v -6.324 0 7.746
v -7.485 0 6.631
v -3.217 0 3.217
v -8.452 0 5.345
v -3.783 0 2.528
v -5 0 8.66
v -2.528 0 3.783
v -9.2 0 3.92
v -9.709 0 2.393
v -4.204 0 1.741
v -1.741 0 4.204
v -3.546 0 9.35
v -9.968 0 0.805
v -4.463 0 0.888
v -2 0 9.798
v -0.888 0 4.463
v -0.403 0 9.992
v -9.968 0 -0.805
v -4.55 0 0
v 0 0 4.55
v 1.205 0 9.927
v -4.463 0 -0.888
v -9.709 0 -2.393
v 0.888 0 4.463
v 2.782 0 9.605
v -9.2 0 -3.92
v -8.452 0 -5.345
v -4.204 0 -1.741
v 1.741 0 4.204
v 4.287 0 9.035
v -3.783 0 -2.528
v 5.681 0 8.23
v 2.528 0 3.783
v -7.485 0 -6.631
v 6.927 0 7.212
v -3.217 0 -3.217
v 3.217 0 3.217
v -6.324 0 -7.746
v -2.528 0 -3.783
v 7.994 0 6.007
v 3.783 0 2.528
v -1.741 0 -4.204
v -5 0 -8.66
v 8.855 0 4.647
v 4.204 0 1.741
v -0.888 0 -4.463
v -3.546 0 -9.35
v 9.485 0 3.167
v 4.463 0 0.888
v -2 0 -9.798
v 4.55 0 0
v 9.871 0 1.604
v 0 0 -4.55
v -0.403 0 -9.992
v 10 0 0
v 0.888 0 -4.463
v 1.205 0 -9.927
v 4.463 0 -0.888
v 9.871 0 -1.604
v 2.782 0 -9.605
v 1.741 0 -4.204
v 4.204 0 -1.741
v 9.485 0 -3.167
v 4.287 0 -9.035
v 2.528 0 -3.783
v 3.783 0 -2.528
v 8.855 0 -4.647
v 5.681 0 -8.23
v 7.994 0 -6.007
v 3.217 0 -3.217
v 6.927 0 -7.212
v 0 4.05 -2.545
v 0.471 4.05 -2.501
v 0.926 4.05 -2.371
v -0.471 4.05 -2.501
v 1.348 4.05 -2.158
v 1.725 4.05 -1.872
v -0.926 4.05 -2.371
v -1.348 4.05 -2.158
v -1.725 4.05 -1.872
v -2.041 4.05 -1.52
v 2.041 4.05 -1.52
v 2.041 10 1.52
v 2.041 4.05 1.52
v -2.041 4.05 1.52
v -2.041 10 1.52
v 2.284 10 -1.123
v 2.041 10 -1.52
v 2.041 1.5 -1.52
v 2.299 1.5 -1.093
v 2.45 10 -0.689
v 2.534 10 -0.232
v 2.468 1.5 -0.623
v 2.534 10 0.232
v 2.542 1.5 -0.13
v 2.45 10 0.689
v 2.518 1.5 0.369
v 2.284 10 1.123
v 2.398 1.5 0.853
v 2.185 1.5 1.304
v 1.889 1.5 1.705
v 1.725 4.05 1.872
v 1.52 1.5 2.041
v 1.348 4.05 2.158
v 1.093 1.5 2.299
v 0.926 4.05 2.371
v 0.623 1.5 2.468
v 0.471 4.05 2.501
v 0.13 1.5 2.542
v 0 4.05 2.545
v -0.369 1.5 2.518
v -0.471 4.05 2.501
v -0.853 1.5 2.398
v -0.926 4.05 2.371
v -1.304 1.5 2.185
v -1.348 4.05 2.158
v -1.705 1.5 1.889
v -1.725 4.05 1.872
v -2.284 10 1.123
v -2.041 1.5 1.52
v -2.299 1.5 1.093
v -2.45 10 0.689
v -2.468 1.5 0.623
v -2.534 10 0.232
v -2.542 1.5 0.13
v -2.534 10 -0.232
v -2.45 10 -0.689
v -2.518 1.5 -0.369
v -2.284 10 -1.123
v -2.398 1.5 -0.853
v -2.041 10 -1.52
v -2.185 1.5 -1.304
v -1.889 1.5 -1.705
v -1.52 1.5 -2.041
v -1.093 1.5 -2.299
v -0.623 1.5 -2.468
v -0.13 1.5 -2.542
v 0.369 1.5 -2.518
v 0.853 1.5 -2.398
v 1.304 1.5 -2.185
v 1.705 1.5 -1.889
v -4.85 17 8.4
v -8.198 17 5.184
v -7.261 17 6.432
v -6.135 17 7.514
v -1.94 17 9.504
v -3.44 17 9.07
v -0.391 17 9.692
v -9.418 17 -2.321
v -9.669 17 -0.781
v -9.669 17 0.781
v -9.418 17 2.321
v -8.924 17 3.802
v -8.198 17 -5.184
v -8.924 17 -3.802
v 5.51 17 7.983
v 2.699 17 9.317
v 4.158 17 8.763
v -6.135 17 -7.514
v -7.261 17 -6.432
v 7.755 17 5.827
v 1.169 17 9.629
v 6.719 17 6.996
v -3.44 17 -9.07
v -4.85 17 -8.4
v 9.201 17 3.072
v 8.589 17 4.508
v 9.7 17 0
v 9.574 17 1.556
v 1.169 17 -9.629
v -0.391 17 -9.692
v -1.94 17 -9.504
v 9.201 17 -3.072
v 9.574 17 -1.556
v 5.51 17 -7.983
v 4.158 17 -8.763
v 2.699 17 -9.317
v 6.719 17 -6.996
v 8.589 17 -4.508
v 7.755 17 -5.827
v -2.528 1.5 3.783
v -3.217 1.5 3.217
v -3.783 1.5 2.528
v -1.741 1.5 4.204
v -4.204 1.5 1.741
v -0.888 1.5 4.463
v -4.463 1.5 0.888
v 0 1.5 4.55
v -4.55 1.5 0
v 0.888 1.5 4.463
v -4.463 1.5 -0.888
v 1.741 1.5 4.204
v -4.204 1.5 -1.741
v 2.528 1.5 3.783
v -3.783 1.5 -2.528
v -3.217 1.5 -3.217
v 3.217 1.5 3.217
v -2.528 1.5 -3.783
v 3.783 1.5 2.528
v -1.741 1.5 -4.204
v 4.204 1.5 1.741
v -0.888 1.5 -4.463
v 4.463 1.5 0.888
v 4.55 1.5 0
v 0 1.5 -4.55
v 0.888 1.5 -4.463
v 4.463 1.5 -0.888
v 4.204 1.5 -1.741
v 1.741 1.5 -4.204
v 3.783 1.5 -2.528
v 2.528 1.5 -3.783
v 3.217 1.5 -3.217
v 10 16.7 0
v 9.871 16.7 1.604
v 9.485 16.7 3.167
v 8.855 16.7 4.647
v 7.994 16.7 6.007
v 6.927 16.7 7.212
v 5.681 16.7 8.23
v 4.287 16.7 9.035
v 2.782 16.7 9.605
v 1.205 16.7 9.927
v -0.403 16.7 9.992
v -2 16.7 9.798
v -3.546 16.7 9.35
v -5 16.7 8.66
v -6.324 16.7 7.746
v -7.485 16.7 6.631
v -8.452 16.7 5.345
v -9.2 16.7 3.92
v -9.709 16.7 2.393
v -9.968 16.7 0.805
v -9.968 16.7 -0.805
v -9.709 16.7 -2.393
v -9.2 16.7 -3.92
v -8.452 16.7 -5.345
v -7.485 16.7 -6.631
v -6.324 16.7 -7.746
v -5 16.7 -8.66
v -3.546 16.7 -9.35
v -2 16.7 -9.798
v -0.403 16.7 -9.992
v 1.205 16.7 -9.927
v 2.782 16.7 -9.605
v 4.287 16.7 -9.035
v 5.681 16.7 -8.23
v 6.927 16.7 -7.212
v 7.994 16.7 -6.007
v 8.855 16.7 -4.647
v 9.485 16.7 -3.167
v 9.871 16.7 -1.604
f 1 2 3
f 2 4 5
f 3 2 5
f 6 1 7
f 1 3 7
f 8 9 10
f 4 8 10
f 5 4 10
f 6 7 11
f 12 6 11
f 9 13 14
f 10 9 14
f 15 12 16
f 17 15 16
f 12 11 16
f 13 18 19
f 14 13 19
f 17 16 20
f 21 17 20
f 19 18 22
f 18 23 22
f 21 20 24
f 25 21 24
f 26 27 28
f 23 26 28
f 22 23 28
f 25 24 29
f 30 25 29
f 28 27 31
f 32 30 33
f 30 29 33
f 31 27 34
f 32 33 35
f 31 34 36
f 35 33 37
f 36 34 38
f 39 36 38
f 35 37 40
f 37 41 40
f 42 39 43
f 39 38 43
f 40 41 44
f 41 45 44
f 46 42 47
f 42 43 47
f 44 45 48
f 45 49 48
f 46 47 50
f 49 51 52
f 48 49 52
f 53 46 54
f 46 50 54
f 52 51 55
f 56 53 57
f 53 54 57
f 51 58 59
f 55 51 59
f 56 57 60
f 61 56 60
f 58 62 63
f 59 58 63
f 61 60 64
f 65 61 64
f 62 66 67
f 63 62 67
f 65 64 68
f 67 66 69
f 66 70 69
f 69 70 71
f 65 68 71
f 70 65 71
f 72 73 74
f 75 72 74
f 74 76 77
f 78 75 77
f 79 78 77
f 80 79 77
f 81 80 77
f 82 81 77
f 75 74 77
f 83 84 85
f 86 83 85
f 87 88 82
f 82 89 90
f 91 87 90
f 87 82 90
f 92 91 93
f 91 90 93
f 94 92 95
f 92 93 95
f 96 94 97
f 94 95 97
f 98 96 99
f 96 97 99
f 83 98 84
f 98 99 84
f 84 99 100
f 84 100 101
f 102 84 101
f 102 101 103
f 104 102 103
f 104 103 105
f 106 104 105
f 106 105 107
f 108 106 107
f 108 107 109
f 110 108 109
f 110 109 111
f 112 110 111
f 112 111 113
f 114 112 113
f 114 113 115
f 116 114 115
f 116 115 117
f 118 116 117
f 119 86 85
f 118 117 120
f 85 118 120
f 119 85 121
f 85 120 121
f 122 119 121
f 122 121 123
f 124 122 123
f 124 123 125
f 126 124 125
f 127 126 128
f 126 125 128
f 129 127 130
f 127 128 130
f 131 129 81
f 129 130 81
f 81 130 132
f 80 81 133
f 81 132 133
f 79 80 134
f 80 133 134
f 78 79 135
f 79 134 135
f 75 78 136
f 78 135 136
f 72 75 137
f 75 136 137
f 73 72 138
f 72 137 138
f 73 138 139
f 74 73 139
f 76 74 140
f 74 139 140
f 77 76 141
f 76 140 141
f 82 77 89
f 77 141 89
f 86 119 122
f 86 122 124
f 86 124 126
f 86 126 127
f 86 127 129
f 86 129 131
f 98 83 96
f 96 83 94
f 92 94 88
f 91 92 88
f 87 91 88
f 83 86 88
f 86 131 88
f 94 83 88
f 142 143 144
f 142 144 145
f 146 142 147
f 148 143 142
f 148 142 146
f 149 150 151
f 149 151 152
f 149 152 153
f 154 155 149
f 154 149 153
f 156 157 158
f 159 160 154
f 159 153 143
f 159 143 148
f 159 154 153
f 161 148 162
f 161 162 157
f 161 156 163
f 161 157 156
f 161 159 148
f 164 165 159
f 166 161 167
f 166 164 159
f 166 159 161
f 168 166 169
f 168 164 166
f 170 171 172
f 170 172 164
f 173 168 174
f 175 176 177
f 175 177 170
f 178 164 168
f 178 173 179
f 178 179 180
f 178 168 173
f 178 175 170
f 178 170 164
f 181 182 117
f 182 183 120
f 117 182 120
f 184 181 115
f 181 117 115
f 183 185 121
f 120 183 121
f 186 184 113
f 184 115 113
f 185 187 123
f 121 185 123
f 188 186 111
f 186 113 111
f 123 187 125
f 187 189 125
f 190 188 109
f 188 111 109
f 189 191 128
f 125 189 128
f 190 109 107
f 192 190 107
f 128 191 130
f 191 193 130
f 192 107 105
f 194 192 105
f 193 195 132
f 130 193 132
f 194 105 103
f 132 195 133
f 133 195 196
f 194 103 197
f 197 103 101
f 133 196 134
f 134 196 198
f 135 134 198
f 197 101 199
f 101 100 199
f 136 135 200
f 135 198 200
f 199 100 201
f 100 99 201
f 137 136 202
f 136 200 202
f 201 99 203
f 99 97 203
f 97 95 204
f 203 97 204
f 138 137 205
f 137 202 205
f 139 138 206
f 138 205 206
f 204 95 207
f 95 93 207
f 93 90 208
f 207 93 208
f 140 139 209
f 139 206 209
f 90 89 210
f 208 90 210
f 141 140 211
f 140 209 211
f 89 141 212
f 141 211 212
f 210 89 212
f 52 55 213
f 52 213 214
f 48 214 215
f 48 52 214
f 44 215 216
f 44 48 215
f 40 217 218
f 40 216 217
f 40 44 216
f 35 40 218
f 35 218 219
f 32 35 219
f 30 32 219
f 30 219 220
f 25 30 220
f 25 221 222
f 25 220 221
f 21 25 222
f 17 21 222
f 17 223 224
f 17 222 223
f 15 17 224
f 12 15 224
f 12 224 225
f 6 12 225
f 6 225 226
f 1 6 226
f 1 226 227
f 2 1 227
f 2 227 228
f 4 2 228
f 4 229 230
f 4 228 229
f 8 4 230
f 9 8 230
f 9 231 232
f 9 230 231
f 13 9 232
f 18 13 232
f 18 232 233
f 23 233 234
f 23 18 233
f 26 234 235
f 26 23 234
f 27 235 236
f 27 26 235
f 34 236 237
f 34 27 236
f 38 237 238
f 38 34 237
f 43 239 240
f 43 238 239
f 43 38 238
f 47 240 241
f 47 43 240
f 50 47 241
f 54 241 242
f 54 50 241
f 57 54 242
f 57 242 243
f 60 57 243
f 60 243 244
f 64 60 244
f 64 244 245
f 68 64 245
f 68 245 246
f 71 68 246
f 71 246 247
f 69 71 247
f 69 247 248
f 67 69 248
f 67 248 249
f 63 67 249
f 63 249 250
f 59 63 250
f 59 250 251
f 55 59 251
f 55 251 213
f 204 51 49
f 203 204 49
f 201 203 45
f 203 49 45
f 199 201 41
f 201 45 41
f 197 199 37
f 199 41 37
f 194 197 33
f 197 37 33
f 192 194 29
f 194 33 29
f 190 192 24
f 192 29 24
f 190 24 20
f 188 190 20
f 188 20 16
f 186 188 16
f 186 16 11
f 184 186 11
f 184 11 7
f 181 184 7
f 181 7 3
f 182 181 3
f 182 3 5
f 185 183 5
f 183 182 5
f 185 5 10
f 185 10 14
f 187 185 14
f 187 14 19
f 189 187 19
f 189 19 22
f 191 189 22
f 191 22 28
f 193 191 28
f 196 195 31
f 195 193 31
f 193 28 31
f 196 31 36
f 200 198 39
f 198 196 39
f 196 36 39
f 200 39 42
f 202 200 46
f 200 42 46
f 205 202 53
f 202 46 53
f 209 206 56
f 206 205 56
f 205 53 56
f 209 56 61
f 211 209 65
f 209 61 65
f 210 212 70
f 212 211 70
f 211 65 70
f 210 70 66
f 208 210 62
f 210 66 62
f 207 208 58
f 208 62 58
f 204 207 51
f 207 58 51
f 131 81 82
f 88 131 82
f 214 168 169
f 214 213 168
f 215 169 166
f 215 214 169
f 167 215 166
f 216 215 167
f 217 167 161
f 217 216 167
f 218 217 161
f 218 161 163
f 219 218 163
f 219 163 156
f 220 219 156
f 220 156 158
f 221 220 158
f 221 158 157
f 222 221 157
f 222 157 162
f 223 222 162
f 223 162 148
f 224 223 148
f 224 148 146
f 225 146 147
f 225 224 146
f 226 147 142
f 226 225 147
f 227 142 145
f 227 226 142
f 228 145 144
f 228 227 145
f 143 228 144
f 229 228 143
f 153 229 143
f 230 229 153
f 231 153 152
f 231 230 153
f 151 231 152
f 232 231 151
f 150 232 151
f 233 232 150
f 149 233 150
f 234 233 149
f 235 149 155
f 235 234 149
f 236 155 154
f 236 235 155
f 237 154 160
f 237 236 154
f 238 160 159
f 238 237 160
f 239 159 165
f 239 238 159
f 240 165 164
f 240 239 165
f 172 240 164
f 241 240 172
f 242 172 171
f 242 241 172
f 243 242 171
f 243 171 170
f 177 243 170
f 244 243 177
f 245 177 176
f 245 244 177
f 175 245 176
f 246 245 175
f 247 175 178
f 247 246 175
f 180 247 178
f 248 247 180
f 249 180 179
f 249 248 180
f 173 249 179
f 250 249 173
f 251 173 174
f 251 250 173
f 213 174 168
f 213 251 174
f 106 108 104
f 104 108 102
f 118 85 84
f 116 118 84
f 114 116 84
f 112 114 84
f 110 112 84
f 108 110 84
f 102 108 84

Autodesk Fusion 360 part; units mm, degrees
sketch "Sketch1" plane through (0, 0, 0) normal (0, 1, 0) x (1, 0, 0)
  circle A0 centre (0, 0) radius 10
  circle A1 centre (0, 0) radius 4.55
  circle A2 centre (0, 0) radius 2.545
  line L0 (0, 1.52) -> (2.0412, 1.52)
  line L1 (0, 1.52) -> (-2.0412, 1.52)
  line L2 (0, -1.52) -> (-2.0412, -1.52)
  line L3 (0, -1.52) -> (2.0412, -1.52)
  dimension "d1" = 20
  dimension "d2" = 9.1
  dimension "d3" = 5.09
  dimension "d4" = 1.52
  dimension "d6" = 1.52
extrude "Extrude1" add sketch "Sketch1" along normal blind 17 contours A0 | A1 | A2 L0 L1 L2 L3 | A2 L0 L1 | A2 L2 L3
extrude "Extrude2" cut sketch "Sketch1" along normal blind 10 contours A2 L0 L1 L2 L3
extrude "Extrude3" cut sketch "Sketch1" along normal blind 4.05 contours A2 L0 L1 | A2 L2 L3
extrude "Extrude4" cut sketch "Sketch1" along normal blind 1.5 contours A1
chamfer "Chamfer1" distance 0.3 angle 45 1 edges at (-9.3233, 17, 3.6162)
